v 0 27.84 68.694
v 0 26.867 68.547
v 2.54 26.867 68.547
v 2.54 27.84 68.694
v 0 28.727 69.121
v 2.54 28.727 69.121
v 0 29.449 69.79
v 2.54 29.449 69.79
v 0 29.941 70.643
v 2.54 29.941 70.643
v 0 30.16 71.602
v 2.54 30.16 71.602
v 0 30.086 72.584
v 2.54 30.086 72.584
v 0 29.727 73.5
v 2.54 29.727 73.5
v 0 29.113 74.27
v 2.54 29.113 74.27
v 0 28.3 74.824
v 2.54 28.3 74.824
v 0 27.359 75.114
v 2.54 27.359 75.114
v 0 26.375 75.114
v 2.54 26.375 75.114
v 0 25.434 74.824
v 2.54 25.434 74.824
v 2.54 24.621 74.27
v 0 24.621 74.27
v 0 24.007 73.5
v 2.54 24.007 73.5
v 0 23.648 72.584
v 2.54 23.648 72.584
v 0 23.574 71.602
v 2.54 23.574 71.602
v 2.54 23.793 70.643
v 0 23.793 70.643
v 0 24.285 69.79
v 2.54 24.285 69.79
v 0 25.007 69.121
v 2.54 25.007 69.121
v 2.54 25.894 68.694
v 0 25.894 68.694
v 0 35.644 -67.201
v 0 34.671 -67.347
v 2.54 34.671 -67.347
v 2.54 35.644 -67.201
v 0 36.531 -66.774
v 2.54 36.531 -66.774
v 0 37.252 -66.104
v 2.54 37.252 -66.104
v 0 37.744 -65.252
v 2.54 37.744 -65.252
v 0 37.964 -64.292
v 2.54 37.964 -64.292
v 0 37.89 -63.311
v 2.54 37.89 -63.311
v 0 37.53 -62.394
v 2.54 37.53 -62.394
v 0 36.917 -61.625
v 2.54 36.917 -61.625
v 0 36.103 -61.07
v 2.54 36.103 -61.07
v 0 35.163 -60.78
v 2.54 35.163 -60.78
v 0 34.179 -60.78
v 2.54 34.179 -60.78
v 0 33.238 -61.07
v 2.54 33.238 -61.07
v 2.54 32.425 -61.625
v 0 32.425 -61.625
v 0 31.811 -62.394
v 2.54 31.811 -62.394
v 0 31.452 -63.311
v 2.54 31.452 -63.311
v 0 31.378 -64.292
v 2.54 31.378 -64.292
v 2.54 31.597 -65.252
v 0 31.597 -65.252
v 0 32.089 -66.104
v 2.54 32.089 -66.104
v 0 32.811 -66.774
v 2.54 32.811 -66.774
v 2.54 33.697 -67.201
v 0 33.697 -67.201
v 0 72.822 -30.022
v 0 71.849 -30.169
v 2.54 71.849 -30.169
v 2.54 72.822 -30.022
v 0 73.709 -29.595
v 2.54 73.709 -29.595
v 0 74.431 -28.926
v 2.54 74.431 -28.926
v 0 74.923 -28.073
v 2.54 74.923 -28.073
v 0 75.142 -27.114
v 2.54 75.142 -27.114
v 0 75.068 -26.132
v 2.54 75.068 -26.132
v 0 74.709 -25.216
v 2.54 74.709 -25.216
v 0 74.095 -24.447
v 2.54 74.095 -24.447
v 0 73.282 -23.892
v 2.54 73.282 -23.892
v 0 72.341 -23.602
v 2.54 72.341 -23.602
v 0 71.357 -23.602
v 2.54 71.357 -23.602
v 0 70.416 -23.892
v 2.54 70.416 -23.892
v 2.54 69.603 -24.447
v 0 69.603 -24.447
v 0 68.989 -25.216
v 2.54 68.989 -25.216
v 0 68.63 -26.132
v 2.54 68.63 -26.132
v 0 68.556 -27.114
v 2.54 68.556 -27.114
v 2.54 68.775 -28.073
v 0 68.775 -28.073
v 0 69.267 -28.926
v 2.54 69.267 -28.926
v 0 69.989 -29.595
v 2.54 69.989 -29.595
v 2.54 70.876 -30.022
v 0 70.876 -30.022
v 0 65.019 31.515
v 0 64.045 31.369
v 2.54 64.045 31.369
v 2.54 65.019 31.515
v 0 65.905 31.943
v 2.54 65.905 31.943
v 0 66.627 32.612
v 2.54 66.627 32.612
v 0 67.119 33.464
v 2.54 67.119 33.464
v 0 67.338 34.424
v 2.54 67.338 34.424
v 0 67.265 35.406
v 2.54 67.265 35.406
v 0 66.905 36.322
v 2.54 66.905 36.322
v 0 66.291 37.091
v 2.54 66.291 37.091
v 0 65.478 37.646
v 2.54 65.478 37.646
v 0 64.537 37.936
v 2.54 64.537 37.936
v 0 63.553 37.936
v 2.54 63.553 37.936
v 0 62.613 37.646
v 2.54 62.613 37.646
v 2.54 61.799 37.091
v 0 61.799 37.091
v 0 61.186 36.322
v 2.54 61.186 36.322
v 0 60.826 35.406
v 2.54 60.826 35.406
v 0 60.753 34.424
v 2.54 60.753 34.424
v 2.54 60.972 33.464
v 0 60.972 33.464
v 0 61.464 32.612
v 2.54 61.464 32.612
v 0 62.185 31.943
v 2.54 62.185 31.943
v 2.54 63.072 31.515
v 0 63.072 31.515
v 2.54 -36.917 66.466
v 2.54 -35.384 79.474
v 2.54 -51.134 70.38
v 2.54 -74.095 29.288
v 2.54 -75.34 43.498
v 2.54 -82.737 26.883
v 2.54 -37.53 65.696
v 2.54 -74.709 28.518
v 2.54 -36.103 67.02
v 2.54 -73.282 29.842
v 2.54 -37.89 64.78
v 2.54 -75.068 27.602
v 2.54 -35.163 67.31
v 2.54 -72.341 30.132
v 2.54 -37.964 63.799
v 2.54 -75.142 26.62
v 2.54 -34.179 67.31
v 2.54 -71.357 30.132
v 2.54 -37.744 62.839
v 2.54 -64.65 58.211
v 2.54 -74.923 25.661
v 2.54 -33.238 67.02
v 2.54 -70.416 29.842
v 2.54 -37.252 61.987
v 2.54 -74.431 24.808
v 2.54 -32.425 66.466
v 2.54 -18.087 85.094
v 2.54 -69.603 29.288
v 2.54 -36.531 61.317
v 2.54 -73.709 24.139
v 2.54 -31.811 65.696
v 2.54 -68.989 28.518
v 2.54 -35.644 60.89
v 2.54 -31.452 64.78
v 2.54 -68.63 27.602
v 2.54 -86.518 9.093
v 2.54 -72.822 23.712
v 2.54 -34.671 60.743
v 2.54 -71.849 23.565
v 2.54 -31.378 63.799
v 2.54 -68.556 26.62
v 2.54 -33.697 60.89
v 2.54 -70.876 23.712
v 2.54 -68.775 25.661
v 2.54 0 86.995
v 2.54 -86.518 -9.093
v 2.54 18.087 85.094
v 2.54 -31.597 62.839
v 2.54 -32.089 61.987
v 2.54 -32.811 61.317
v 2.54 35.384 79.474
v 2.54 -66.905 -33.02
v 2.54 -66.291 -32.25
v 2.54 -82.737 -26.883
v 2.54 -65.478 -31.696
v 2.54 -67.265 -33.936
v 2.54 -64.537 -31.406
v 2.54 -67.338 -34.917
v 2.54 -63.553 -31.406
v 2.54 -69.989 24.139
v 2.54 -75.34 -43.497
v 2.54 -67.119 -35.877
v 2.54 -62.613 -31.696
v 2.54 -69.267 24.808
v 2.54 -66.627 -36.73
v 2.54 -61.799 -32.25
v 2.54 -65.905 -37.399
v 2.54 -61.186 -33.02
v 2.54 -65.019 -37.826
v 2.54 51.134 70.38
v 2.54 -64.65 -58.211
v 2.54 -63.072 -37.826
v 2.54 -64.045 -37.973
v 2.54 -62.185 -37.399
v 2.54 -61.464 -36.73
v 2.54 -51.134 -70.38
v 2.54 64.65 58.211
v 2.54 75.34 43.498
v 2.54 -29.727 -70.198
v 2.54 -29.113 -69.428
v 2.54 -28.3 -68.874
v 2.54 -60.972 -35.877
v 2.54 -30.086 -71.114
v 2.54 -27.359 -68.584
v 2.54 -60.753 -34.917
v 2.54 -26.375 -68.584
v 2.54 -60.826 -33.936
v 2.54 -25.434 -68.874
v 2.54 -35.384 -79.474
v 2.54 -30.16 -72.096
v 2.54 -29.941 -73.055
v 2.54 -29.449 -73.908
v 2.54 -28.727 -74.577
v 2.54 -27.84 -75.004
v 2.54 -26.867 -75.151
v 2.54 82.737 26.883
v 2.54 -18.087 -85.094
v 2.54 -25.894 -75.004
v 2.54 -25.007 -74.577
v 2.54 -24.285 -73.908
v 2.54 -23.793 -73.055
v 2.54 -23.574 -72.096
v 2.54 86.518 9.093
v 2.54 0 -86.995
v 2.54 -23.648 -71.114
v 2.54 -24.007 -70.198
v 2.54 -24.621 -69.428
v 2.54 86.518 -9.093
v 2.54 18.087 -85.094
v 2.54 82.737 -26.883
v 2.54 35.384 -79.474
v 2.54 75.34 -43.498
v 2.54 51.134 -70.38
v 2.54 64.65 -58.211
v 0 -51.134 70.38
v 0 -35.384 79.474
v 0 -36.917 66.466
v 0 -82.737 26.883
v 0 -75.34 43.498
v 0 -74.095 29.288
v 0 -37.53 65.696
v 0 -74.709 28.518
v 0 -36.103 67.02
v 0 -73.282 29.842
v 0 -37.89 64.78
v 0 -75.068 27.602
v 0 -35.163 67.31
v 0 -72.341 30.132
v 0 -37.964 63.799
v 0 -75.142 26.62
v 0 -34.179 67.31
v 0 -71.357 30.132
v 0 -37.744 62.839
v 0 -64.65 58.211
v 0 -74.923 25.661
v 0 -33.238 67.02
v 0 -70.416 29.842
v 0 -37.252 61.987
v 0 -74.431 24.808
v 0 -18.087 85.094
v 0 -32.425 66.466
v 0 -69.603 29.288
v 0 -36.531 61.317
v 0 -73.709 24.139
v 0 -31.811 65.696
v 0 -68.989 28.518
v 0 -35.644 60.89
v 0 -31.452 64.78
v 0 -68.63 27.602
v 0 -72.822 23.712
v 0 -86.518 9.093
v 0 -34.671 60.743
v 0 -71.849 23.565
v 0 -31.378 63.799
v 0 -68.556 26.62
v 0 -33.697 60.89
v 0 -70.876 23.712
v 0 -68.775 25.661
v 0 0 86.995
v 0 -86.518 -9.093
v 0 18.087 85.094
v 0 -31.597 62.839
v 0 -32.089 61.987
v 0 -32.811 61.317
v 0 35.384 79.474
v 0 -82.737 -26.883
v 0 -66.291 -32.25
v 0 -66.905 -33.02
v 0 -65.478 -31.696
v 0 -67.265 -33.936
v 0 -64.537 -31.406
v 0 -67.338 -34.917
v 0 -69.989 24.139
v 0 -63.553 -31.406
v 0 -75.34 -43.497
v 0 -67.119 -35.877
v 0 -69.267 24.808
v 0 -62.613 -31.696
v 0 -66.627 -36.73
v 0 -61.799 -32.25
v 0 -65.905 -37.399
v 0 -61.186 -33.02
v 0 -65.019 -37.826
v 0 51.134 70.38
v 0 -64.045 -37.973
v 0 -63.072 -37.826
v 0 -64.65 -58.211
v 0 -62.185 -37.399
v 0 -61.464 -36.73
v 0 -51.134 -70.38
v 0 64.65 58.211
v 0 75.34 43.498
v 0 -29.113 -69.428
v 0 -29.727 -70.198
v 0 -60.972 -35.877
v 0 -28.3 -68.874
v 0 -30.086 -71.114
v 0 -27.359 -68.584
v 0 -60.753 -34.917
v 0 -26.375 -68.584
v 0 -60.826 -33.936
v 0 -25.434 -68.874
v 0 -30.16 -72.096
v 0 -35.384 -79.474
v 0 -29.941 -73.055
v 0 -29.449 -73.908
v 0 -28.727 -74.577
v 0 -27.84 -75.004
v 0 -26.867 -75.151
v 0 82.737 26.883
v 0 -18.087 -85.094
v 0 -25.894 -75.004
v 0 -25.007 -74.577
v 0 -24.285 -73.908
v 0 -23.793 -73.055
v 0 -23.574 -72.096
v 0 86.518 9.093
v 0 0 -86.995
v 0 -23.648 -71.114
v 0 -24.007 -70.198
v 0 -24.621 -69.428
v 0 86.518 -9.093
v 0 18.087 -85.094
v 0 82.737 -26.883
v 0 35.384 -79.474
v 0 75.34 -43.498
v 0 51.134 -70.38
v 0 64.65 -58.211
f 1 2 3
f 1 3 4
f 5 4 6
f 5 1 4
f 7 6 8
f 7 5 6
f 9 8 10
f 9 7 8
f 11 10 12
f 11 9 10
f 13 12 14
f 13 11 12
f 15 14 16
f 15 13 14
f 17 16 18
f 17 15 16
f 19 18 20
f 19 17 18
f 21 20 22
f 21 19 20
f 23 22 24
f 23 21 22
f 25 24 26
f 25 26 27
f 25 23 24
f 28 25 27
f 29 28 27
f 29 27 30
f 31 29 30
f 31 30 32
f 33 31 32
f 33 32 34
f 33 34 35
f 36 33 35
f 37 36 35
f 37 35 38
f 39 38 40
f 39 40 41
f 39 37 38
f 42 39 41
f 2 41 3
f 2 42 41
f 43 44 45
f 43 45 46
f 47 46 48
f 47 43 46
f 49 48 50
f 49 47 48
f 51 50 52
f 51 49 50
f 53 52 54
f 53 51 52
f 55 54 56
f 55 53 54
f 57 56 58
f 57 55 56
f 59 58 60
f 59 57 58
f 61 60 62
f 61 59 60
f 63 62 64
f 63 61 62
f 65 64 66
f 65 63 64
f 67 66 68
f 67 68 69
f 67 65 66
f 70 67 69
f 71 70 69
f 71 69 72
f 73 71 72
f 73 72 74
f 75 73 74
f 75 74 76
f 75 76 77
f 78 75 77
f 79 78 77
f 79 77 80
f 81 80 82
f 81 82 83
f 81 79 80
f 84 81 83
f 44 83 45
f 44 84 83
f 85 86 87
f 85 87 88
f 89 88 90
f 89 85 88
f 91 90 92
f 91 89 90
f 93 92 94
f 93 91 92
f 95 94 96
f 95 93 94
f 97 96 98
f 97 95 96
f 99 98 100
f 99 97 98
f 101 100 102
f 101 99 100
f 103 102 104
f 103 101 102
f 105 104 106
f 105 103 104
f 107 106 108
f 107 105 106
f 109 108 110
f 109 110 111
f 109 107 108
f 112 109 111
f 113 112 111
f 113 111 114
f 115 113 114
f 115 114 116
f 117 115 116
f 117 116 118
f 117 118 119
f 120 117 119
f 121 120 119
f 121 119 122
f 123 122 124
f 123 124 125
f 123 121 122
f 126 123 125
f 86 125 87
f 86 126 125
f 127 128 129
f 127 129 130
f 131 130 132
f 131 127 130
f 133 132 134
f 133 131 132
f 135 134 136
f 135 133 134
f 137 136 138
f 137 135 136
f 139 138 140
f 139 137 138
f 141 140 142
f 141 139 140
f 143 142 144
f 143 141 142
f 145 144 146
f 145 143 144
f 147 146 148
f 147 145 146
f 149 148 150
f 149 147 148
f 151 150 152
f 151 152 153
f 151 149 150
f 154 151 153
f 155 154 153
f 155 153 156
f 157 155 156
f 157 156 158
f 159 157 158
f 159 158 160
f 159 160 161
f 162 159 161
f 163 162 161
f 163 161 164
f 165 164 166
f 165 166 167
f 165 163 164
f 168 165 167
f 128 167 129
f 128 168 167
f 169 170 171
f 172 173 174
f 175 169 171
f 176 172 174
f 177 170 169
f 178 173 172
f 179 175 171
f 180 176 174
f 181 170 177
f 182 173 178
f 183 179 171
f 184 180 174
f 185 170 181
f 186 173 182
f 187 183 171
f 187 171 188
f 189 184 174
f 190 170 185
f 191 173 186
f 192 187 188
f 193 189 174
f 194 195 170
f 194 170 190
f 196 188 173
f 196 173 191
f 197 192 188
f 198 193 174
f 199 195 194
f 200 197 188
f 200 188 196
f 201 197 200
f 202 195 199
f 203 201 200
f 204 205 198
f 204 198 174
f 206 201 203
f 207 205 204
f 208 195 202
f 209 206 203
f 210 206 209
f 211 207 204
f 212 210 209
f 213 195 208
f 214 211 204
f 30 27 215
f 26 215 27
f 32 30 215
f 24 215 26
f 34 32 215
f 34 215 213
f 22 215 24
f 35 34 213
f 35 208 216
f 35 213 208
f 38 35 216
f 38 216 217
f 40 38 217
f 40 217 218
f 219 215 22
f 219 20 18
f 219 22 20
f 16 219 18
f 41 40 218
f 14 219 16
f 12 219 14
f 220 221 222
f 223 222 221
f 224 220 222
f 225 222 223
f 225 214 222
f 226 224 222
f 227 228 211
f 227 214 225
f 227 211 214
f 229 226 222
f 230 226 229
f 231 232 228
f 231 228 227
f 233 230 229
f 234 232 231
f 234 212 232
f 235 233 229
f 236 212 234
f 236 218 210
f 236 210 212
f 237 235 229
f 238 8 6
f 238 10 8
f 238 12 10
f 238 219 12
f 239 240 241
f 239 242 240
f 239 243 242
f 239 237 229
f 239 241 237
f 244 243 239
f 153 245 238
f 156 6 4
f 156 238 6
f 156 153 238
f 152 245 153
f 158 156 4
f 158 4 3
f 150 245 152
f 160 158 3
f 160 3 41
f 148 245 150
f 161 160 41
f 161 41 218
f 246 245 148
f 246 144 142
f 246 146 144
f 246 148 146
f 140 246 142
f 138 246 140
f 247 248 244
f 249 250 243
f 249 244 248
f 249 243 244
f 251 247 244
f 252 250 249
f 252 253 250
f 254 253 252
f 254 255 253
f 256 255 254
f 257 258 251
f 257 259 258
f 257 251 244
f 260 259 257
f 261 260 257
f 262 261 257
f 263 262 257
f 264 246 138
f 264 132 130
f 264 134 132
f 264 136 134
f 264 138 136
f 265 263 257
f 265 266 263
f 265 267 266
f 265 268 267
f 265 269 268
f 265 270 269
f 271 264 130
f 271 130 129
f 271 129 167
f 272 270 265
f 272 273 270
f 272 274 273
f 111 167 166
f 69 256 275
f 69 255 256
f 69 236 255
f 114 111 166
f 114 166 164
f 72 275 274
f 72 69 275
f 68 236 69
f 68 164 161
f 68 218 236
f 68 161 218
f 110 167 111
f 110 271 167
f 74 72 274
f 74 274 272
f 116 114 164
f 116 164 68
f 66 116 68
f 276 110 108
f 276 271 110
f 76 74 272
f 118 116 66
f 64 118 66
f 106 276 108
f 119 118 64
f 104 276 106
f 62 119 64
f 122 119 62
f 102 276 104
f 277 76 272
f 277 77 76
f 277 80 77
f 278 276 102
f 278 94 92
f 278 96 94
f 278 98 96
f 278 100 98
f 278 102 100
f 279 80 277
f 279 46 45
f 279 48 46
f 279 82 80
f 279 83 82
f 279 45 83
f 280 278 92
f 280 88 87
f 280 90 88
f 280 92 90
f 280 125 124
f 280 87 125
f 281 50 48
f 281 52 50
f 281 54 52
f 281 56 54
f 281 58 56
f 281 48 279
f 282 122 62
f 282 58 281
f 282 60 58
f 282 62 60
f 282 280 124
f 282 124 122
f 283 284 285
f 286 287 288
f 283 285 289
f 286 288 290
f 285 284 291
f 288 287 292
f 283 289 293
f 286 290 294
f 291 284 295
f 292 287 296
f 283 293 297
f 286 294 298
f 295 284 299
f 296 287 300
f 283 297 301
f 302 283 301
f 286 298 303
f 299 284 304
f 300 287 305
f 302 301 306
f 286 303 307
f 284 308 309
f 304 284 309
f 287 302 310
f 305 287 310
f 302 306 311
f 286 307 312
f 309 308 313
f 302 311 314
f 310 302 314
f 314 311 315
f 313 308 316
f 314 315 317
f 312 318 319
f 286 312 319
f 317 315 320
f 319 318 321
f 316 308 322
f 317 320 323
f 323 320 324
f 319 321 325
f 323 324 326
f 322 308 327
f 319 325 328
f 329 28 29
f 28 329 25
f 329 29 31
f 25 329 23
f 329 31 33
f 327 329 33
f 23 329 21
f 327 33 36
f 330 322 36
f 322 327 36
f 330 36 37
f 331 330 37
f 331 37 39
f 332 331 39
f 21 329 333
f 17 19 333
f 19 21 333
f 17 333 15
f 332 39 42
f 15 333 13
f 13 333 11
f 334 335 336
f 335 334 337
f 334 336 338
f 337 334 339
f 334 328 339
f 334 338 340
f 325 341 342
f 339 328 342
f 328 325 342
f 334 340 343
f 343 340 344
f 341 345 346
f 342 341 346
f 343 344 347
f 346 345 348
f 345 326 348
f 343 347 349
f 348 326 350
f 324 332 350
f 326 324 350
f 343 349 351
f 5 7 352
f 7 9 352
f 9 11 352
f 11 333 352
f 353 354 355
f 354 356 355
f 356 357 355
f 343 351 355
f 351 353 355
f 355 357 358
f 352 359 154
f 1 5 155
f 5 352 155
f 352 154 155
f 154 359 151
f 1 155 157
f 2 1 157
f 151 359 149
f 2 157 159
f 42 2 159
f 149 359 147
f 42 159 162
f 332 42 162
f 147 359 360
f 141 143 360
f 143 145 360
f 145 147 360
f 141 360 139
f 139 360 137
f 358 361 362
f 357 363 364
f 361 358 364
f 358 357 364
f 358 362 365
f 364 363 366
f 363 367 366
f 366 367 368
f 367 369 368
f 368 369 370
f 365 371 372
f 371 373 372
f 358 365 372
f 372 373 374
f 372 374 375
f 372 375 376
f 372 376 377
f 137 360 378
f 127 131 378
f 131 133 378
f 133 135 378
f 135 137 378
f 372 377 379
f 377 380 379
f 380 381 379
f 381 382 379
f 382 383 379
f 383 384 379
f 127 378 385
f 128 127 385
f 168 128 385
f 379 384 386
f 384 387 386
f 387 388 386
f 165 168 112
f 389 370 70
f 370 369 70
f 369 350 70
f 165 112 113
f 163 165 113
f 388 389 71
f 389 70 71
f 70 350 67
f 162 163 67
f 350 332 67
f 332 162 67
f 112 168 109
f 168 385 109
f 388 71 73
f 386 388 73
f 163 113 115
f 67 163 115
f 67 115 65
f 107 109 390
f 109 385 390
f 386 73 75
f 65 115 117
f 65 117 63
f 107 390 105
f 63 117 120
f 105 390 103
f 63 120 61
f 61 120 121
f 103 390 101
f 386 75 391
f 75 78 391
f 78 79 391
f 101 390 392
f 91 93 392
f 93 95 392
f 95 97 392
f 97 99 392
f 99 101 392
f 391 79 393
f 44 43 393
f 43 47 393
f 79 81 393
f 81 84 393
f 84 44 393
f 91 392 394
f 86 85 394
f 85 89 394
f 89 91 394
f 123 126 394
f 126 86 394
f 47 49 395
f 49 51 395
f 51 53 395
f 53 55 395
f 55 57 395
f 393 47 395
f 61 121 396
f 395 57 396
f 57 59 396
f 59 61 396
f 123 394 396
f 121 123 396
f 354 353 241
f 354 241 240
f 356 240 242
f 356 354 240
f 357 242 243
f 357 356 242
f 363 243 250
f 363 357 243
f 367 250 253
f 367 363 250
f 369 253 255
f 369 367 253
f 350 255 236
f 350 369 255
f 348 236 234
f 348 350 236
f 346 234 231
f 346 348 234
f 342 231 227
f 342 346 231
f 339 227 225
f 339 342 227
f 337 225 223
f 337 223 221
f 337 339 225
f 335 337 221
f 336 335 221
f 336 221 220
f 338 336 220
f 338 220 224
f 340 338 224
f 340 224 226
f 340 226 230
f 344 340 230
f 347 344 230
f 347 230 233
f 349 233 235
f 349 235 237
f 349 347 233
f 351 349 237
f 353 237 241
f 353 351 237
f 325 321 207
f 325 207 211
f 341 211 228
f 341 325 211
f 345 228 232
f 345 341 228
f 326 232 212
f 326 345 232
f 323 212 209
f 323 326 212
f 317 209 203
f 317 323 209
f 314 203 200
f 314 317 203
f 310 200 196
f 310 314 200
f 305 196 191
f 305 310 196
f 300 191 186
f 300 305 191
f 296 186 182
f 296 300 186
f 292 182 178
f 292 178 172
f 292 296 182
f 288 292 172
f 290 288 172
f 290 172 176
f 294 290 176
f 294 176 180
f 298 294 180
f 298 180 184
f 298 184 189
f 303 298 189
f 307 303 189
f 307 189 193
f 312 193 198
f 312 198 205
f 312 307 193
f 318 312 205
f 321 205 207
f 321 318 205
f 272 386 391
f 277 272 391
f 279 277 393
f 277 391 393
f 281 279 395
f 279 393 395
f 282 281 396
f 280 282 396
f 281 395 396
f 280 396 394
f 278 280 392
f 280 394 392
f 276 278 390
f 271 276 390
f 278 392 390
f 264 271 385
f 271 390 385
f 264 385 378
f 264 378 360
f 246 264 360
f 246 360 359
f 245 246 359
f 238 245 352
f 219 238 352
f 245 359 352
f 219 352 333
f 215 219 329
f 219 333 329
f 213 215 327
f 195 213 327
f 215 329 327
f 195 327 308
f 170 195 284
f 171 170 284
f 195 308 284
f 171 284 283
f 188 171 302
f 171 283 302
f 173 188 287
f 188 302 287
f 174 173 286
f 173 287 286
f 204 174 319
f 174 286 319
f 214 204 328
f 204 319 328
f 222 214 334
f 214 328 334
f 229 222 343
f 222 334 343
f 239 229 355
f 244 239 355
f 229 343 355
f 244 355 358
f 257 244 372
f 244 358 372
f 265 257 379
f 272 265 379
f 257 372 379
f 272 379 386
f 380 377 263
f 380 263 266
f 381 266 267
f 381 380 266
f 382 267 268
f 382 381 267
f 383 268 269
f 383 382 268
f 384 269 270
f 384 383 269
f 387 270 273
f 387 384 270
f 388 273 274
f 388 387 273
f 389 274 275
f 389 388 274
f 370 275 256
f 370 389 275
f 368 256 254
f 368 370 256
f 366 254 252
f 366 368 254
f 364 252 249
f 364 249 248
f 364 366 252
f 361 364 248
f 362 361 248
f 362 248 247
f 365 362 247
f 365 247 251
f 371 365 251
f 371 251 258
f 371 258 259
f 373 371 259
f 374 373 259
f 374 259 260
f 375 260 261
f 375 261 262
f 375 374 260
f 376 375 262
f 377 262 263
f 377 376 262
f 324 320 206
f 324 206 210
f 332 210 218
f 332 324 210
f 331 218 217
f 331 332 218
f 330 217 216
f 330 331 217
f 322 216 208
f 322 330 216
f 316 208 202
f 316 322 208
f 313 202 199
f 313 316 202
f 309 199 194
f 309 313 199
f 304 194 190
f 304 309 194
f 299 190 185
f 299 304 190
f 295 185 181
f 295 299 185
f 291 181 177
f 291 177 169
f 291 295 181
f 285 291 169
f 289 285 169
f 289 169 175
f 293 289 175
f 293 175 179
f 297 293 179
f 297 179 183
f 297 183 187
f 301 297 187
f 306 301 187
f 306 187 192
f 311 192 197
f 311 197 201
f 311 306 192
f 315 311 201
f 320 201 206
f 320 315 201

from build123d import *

# Parameters (mm, degrees)
SKETCH1_R           = 86.995
SKETCH1_R_2         = 3.302
BOSS_EXTRUDE1_DEPTH = 2.54


with BuildPart() as part:
    # Sketch1 → Boss-Extrude1 (new body)
    with BuildSketch(Plane.YZ):
        with Locations(Location((0, 0, 0), (0, 0, 270))):
            Circle(SKETCH1_R)
        with Locations(Location((26.867048584, 71.849001137, 0), (0, 0, 270))):
            Circle(SKETCH1_R_2, mode=Mode.SUBTRACT)
        with Locations(Location((64.045308925, 34.670740796, 0), (0, 0, 270))):
            Circle(SKETCH1_R_2, mode=Mode.SUBTRACT)
        with Locations(Location((71.849001137, -26.867048584, 0), (0, 0, 270))):
            Circle(SKETCH1_R_2, mode=Mode.SUBTRACT)
        with Locations(Location((34.670740796, -64.045308925, 0), (0, 0, 270))):
            Circle(SKETCH1_R_2, mode=Mode.SUBTRACT)
        with Locations(Location((-26.867048584, -71.849001137, 0), (0, 0, 270))):
            Circle(SKETCH1_R_2, mode=Mode.SUBTRACT)
        with Locations(Location((-64.045308925, -34.670740796, 0), (0, 0, 270))):
            Circle(SKETCH1_R_2, mode=Mode.SUBTRACT)
        with Locations(Location((-71.849001137, 26.867048584, 0), (0, 0, 270))):
            Circle(SKETCH1_R_2, mode=Mode.SUBTRACT)
        with Locations(Location((-34.670740796, 64.045308925, 0), (0, 0, 270))):
            Circle(SKETCH1_R_2, mode=Mode.SUBTRACT)
    extrude(amount=BOSS_EXTRUDE1_DEPTH)


solid = part.part
